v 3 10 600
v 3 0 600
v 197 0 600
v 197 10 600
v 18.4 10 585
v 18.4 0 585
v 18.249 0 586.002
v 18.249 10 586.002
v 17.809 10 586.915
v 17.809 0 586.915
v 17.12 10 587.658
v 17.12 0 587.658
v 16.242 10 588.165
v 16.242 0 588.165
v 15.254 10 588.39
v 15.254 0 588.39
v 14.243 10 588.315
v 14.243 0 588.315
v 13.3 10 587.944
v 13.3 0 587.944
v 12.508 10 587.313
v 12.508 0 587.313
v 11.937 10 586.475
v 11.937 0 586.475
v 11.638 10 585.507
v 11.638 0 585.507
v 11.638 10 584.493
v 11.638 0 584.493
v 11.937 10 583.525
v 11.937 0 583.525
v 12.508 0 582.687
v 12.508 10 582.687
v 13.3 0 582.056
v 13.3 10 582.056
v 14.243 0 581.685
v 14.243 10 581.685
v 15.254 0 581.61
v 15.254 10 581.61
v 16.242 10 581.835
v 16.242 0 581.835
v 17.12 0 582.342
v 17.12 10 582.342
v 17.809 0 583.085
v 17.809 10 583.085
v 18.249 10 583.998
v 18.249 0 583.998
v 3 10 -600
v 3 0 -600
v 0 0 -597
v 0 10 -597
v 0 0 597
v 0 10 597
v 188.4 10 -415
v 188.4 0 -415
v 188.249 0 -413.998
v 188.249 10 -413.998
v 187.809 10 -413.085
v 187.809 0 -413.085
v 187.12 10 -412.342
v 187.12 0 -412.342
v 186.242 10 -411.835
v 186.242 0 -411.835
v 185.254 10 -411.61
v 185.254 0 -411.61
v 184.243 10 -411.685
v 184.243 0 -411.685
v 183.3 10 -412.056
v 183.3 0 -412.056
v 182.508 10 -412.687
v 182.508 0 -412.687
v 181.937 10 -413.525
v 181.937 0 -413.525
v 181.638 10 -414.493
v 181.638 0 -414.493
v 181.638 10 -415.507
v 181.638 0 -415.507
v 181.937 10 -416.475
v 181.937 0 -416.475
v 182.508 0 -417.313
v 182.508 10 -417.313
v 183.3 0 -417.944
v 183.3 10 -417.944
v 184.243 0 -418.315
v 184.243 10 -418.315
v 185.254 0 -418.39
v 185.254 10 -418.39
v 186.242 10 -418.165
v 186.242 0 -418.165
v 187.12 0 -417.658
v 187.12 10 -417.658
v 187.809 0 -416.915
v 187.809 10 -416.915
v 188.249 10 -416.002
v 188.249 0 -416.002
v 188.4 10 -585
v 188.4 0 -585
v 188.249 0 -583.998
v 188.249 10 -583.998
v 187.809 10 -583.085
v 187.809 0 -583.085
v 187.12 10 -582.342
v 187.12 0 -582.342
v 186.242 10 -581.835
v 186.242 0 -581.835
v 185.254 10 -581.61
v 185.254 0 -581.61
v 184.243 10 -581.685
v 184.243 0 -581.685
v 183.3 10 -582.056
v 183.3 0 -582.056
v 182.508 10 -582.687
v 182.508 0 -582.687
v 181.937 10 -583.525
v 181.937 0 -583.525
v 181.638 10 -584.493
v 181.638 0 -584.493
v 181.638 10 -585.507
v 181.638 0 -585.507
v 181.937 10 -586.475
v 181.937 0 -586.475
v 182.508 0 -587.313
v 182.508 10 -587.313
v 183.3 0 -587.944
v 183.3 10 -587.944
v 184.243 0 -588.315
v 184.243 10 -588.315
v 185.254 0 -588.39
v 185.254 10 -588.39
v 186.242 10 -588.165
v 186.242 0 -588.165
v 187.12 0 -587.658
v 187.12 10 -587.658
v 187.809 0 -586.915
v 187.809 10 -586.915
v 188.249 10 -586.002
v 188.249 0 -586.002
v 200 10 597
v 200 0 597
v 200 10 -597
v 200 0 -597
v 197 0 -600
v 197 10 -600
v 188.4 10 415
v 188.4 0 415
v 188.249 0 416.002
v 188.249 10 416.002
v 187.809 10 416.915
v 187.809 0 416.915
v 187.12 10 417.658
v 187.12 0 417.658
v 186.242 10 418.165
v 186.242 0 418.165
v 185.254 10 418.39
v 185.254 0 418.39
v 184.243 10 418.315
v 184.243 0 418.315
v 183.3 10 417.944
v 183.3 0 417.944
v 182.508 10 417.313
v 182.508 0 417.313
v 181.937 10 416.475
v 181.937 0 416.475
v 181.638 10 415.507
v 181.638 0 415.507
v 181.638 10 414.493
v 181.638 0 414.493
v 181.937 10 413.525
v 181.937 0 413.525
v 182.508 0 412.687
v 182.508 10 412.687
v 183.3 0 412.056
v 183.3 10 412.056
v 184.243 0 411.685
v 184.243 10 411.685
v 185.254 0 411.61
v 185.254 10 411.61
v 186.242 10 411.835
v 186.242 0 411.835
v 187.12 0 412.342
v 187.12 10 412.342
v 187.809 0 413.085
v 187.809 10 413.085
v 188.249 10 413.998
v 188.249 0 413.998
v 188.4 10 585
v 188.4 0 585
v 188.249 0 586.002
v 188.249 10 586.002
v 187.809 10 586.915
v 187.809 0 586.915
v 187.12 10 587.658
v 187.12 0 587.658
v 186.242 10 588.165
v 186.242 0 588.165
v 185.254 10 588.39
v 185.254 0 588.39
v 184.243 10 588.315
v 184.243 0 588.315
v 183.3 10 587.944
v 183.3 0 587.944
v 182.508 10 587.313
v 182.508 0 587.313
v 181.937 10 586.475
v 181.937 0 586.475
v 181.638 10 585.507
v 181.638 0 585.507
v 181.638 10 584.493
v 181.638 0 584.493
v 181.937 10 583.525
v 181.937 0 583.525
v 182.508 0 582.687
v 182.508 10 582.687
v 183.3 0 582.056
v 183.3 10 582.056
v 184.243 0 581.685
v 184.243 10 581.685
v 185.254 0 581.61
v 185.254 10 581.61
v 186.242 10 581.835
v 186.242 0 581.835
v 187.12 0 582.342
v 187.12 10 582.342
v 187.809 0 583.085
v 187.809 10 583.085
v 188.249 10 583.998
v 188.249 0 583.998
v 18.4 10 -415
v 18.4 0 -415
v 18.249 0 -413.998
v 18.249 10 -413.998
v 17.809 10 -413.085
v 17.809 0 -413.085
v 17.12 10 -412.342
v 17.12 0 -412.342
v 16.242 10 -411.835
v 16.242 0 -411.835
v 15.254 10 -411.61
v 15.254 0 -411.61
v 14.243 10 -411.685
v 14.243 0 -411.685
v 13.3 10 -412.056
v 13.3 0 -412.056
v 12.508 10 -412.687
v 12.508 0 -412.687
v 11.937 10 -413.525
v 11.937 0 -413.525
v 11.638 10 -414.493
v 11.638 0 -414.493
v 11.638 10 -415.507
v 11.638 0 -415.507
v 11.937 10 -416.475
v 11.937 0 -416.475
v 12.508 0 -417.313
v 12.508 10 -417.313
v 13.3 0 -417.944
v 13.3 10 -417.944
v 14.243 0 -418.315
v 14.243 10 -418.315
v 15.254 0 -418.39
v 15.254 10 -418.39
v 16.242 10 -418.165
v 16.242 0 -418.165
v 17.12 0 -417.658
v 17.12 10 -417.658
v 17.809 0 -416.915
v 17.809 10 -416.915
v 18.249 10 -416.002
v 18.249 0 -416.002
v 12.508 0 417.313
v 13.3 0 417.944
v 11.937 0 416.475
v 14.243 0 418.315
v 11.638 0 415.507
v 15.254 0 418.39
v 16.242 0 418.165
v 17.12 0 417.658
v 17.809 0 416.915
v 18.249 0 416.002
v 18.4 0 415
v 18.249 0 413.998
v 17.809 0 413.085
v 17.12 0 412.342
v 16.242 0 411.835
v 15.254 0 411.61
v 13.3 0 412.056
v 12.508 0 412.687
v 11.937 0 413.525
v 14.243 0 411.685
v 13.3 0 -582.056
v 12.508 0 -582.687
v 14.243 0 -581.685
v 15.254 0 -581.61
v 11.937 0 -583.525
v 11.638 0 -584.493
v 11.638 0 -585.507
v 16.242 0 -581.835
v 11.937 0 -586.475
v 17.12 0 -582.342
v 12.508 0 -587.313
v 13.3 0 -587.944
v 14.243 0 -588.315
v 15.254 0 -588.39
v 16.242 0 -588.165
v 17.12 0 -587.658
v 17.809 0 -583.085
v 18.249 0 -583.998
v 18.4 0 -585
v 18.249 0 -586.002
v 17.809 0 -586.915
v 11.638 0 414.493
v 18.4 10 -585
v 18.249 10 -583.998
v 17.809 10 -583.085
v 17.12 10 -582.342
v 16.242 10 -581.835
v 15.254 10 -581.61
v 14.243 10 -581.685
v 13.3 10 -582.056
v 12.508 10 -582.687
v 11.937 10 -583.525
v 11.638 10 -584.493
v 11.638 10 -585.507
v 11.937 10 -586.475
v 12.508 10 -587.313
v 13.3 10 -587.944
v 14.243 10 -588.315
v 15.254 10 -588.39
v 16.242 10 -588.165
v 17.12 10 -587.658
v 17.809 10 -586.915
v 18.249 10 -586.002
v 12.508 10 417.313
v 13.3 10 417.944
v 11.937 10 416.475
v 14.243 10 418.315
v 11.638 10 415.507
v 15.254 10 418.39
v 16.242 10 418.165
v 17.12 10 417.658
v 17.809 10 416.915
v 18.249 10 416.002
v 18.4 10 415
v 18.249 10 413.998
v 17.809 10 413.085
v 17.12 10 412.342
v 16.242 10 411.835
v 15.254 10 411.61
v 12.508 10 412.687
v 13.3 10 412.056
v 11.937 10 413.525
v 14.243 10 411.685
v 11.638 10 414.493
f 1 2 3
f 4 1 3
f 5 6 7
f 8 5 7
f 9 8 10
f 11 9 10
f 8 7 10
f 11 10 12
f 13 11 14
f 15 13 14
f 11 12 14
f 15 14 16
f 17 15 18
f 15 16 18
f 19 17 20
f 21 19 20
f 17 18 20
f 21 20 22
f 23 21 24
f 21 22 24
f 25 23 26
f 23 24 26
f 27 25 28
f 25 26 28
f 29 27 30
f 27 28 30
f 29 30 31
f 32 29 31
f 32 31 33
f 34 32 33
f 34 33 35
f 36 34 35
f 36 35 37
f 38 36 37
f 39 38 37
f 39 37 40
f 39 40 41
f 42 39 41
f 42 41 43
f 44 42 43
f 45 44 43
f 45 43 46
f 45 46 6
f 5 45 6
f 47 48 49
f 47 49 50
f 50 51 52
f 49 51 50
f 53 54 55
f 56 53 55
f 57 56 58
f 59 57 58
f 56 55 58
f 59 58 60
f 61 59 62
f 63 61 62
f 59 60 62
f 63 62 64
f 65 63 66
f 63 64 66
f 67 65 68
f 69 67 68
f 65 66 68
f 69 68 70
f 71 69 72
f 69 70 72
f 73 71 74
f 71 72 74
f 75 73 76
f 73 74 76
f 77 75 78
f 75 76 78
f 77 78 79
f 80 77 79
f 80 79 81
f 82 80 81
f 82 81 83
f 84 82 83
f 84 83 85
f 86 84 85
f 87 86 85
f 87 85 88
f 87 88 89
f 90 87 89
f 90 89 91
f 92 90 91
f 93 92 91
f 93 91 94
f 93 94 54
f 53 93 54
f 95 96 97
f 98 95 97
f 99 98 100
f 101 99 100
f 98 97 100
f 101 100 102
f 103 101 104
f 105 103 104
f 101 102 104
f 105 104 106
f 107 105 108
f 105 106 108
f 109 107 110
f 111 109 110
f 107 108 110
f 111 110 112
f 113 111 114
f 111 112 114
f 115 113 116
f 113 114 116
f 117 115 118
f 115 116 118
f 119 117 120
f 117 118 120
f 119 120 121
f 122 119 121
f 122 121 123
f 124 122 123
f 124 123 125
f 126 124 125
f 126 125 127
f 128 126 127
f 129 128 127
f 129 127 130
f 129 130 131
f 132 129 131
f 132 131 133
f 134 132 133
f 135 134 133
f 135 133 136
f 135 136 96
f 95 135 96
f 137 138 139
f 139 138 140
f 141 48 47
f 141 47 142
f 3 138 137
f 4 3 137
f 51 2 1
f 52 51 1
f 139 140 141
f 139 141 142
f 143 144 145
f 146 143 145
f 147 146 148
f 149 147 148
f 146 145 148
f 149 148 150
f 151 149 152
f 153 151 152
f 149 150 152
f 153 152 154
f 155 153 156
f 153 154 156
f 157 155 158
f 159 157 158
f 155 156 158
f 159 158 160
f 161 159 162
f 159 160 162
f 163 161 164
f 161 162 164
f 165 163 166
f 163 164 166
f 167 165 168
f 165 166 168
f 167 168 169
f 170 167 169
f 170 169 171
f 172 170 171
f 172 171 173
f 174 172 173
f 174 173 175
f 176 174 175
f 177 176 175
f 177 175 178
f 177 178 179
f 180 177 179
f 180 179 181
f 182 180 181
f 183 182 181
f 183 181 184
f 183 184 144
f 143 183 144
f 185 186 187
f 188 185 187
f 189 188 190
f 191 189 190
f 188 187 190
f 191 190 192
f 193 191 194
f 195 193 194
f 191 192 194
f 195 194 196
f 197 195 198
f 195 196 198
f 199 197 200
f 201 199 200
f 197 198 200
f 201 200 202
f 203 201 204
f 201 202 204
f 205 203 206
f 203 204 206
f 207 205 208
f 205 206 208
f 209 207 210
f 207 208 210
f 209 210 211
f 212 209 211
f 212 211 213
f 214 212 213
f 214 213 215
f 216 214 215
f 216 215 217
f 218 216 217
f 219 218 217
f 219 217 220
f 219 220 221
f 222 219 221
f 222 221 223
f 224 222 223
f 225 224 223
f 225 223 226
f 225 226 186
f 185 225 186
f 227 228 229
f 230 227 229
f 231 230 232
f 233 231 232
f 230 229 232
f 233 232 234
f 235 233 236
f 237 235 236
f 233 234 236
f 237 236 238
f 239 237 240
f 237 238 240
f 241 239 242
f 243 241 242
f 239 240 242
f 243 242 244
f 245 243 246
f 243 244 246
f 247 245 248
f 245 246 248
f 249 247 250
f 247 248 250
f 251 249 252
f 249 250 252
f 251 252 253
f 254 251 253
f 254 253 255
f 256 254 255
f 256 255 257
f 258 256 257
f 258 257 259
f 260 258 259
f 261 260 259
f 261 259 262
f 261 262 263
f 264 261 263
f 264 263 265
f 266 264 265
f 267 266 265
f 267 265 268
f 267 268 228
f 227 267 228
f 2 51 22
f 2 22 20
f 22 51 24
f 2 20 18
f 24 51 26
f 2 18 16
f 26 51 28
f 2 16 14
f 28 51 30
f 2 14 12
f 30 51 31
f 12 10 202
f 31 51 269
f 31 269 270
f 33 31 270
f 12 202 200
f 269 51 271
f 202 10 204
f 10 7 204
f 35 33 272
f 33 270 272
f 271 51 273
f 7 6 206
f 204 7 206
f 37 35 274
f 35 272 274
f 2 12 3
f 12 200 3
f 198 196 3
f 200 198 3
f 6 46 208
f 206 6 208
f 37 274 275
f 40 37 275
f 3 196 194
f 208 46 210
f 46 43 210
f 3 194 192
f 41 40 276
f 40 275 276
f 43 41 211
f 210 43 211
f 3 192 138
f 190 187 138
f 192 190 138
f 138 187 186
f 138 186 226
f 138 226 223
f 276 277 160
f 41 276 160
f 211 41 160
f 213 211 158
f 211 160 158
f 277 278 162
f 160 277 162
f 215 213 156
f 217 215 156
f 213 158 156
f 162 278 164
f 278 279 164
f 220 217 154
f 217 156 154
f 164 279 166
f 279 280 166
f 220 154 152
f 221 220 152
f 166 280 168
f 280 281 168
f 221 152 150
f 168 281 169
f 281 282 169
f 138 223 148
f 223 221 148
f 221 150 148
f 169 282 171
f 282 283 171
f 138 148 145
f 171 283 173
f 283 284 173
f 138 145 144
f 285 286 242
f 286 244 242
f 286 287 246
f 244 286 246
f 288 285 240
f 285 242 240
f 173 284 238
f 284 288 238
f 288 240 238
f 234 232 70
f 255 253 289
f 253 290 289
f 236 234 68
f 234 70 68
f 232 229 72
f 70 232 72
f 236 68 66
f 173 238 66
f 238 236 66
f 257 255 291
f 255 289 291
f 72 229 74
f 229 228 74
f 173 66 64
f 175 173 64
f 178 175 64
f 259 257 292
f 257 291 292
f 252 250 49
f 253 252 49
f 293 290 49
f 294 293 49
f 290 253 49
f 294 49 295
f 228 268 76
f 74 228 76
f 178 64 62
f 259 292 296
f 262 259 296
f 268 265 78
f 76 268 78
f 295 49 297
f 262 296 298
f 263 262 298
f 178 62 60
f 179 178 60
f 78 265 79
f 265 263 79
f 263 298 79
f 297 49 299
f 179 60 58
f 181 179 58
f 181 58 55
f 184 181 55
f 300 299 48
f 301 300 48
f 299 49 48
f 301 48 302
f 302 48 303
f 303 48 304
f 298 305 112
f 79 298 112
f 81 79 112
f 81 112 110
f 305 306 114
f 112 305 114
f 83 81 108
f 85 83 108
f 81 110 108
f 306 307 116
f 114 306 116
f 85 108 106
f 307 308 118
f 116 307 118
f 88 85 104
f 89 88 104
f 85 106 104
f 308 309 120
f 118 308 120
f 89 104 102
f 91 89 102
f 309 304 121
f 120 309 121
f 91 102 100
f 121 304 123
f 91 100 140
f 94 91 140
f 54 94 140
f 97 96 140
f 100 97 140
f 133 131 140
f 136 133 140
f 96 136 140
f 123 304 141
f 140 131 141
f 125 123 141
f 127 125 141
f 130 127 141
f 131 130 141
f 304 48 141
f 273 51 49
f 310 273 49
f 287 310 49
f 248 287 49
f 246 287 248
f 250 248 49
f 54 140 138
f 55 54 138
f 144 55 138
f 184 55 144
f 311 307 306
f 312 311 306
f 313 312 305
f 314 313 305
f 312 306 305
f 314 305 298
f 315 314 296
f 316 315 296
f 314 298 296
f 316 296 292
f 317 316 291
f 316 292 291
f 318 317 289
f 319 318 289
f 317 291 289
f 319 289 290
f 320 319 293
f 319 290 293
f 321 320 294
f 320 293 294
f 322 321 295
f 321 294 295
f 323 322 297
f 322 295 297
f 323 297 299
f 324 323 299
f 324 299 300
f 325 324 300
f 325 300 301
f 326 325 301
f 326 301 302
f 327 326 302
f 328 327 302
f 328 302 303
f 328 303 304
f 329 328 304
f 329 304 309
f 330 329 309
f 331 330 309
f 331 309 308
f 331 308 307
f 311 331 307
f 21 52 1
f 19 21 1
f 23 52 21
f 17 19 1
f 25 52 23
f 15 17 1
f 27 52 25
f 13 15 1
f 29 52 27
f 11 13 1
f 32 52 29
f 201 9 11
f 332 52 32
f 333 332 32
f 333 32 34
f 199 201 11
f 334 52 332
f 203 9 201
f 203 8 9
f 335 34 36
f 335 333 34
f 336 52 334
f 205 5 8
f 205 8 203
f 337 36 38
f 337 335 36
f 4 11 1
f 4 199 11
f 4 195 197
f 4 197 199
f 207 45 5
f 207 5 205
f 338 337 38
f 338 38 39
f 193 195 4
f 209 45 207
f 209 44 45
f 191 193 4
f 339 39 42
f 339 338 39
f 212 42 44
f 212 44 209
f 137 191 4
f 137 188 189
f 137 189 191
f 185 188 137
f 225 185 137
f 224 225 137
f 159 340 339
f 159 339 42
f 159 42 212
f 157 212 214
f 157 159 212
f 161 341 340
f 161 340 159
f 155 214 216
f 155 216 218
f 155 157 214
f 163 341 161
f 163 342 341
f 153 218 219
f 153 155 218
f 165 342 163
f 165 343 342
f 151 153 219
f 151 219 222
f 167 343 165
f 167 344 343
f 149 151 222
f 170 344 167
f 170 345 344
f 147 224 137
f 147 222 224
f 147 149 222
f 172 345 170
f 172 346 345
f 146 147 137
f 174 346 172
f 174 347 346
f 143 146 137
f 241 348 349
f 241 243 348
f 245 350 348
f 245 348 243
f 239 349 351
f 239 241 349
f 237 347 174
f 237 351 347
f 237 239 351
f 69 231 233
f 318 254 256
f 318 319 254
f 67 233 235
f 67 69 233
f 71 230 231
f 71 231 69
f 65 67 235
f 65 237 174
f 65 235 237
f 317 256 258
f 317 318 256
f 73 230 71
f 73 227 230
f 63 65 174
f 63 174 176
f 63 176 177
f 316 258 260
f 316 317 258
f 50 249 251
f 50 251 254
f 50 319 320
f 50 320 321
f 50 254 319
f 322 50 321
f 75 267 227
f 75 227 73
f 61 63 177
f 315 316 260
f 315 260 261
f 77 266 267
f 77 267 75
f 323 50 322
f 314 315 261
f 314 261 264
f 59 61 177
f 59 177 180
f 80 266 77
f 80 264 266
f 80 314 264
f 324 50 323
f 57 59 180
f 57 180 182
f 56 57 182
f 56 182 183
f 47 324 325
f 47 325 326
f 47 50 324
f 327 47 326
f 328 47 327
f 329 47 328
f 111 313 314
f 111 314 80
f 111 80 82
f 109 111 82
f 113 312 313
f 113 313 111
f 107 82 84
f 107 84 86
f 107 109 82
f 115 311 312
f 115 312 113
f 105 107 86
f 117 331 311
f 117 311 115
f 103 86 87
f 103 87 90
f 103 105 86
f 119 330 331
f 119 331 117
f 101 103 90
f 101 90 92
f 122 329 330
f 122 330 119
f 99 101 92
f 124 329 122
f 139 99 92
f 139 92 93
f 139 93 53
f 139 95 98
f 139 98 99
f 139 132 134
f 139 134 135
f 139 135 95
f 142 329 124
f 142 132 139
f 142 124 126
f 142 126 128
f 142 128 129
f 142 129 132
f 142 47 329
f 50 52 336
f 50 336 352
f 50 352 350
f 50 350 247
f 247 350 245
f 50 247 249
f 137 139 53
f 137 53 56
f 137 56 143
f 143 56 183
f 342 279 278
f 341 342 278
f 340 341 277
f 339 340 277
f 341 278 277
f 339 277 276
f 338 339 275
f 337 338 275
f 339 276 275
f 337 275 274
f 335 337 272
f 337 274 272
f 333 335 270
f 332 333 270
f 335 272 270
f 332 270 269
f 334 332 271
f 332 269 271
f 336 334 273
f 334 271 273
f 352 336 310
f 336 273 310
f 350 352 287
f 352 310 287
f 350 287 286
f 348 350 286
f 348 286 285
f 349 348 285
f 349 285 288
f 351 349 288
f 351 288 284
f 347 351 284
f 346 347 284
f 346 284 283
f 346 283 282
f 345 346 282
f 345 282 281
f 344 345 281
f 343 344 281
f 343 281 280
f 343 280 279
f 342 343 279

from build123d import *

# Parameters (mm, degrees)
SKETCH1_W              = 200
SKETCH1_H              = 1200
BOSS_EXTRUDE1_DEPTH    = 10
M8X1_25_TAPPED_HOLE1_D = 6.8
CHAMFER1_SIZE          = 3


with BuildPart() as part:
    # Sketch1 → Boss-Extrude1 (new body)
    with BuildSketch(Plane(origin=(0, 0, 0), x_dir=(1, 0, 0), z_dir=(0, 1, 0))):
        with Locations((100, 0)):
            Rectangle(SKETCH1_W, SKETCH1_H)
    extrude(amount=BOSS_EXTRUDE1_DEPTH)

    # M8x1.25 Tapped Hole1 (through all)
    with Locations(Plane(origin=(0, 10, 0), x_dir=(-1, 0, 0), z_dir=(0, 1, 0))):
        with Locations((-15, -585), (-15, -415), (-185, -415), (-185, -585), (-185, 415), (-185, 585), (-15, 585), (-15, 415)):
            Hole(M8X1_25_TAPPED_HOLE1_D / 2)

    # Chamfer1
    chamfer1_edges = [part.edges().sort_by_distance(p)[0] for p in [
        (0, 5, -600),
        (200, 5, -600),
        (200, 5, 600),
        (0, 5, 600),
    ]]
    chamfer(chamfer1_edges, length=CHAMFER1_SIZE)


solid = part.part
